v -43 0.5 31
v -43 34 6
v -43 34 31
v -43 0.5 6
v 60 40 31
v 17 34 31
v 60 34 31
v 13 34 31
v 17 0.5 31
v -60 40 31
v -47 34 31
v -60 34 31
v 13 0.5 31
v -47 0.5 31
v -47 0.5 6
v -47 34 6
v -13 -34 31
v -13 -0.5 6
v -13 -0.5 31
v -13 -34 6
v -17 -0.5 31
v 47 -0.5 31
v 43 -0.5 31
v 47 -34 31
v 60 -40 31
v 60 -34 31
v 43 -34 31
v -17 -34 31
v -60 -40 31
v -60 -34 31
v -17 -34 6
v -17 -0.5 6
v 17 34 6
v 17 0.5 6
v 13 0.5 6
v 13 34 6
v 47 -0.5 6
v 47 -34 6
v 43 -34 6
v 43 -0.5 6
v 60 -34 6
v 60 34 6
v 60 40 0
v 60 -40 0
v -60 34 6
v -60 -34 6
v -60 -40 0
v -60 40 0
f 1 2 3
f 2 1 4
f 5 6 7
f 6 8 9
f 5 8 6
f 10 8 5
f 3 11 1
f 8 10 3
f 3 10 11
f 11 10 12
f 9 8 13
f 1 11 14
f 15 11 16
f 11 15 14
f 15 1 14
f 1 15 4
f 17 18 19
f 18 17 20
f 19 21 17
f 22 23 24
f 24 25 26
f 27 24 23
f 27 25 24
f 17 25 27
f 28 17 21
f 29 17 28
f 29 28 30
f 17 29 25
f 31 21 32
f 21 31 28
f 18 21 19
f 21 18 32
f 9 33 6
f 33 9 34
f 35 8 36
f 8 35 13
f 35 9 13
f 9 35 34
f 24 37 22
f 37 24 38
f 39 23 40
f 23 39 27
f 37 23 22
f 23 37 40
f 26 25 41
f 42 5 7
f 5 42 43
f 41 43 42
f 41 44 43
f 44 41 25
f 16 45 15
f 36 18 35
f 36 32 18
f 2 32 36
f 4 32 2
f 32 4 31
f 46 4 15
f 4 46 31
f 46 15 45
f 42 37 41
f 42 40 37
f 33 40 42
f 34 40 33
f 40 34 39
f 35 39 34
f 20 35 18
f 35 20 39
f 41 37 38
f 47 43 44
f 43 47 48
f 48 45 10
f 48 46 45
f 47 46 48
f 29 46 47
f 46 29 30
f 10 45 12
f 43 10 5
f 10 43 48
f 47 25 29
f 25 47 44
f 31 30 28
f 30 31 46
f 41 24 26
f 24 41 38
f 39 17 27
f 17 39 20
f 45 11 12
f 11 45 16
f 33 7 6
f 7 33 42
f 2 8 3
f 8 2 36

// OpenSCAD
$fn = 32;

// ----------------------------------------------------------------------
// Rib frame 120 x 80 x 31
// 4 ribs at 30 mm pitch, staggered
// ----------------------------------------------------------------------

// --- parameters (mm) ---
frame = [120, 80, 6];  // base plate size (x, y, z)
rail_w = 6;            // side rail width
ribs = 4;              // number of ribs
rib_t = 4;             // rib thickness
rib_h = 25;            // rib height above the base plate
pitch = 30;            // pitch between rib centres

// --- derived feature positions (mm) ---
span = (ribs - 1) * pitch;          // = 90   distance between the outer ribs
origin_x = -span / 2;               // = -45   X of the first rib
rib_len = frame[1] / 2 - rail_w + 0.5;  // = 34.5   length of a staggered rib
rib_y = 0.5 + rib_len / 2;          // = 17.75   Y of a staggered rib centre
row_offset = 2 * rib_y;             // = 35.5   distance between the two rows
feature_centers = [
  [origin_x + 0 * pitch, rib_y],
  [origin_x + 1 * pitch, -rib_y],
  [origin_x + 2 * pitch, rib_y],
  [origin_x + 3 * pitch, -rib_y]
];   // rib centre line, drives the rib loop

// base plate, two side rails, then the ribs read straight off feature_centers
union() {
  translate([-frame[0] / 2, -frame[1] / 2, 0]) cube(frame);
  translate([-frame[0] / 2, -frame[1] / 2, 0]) cube([frame[0], rail_w, frame[2] + rib_h]);
  translate([-frame[0] / 2, frame[1] / 2 - rail_w, 0]) cube([frame[0], rail_w, frame[2] + rib_h]);
  for (centre = feature_centers)
    translate([centre[0] - rib_t / 2, centre[1] - rib_len / 2, frame[2] - 1])
      cube([rib_t, rib_len, rib_h + 1]);
}
